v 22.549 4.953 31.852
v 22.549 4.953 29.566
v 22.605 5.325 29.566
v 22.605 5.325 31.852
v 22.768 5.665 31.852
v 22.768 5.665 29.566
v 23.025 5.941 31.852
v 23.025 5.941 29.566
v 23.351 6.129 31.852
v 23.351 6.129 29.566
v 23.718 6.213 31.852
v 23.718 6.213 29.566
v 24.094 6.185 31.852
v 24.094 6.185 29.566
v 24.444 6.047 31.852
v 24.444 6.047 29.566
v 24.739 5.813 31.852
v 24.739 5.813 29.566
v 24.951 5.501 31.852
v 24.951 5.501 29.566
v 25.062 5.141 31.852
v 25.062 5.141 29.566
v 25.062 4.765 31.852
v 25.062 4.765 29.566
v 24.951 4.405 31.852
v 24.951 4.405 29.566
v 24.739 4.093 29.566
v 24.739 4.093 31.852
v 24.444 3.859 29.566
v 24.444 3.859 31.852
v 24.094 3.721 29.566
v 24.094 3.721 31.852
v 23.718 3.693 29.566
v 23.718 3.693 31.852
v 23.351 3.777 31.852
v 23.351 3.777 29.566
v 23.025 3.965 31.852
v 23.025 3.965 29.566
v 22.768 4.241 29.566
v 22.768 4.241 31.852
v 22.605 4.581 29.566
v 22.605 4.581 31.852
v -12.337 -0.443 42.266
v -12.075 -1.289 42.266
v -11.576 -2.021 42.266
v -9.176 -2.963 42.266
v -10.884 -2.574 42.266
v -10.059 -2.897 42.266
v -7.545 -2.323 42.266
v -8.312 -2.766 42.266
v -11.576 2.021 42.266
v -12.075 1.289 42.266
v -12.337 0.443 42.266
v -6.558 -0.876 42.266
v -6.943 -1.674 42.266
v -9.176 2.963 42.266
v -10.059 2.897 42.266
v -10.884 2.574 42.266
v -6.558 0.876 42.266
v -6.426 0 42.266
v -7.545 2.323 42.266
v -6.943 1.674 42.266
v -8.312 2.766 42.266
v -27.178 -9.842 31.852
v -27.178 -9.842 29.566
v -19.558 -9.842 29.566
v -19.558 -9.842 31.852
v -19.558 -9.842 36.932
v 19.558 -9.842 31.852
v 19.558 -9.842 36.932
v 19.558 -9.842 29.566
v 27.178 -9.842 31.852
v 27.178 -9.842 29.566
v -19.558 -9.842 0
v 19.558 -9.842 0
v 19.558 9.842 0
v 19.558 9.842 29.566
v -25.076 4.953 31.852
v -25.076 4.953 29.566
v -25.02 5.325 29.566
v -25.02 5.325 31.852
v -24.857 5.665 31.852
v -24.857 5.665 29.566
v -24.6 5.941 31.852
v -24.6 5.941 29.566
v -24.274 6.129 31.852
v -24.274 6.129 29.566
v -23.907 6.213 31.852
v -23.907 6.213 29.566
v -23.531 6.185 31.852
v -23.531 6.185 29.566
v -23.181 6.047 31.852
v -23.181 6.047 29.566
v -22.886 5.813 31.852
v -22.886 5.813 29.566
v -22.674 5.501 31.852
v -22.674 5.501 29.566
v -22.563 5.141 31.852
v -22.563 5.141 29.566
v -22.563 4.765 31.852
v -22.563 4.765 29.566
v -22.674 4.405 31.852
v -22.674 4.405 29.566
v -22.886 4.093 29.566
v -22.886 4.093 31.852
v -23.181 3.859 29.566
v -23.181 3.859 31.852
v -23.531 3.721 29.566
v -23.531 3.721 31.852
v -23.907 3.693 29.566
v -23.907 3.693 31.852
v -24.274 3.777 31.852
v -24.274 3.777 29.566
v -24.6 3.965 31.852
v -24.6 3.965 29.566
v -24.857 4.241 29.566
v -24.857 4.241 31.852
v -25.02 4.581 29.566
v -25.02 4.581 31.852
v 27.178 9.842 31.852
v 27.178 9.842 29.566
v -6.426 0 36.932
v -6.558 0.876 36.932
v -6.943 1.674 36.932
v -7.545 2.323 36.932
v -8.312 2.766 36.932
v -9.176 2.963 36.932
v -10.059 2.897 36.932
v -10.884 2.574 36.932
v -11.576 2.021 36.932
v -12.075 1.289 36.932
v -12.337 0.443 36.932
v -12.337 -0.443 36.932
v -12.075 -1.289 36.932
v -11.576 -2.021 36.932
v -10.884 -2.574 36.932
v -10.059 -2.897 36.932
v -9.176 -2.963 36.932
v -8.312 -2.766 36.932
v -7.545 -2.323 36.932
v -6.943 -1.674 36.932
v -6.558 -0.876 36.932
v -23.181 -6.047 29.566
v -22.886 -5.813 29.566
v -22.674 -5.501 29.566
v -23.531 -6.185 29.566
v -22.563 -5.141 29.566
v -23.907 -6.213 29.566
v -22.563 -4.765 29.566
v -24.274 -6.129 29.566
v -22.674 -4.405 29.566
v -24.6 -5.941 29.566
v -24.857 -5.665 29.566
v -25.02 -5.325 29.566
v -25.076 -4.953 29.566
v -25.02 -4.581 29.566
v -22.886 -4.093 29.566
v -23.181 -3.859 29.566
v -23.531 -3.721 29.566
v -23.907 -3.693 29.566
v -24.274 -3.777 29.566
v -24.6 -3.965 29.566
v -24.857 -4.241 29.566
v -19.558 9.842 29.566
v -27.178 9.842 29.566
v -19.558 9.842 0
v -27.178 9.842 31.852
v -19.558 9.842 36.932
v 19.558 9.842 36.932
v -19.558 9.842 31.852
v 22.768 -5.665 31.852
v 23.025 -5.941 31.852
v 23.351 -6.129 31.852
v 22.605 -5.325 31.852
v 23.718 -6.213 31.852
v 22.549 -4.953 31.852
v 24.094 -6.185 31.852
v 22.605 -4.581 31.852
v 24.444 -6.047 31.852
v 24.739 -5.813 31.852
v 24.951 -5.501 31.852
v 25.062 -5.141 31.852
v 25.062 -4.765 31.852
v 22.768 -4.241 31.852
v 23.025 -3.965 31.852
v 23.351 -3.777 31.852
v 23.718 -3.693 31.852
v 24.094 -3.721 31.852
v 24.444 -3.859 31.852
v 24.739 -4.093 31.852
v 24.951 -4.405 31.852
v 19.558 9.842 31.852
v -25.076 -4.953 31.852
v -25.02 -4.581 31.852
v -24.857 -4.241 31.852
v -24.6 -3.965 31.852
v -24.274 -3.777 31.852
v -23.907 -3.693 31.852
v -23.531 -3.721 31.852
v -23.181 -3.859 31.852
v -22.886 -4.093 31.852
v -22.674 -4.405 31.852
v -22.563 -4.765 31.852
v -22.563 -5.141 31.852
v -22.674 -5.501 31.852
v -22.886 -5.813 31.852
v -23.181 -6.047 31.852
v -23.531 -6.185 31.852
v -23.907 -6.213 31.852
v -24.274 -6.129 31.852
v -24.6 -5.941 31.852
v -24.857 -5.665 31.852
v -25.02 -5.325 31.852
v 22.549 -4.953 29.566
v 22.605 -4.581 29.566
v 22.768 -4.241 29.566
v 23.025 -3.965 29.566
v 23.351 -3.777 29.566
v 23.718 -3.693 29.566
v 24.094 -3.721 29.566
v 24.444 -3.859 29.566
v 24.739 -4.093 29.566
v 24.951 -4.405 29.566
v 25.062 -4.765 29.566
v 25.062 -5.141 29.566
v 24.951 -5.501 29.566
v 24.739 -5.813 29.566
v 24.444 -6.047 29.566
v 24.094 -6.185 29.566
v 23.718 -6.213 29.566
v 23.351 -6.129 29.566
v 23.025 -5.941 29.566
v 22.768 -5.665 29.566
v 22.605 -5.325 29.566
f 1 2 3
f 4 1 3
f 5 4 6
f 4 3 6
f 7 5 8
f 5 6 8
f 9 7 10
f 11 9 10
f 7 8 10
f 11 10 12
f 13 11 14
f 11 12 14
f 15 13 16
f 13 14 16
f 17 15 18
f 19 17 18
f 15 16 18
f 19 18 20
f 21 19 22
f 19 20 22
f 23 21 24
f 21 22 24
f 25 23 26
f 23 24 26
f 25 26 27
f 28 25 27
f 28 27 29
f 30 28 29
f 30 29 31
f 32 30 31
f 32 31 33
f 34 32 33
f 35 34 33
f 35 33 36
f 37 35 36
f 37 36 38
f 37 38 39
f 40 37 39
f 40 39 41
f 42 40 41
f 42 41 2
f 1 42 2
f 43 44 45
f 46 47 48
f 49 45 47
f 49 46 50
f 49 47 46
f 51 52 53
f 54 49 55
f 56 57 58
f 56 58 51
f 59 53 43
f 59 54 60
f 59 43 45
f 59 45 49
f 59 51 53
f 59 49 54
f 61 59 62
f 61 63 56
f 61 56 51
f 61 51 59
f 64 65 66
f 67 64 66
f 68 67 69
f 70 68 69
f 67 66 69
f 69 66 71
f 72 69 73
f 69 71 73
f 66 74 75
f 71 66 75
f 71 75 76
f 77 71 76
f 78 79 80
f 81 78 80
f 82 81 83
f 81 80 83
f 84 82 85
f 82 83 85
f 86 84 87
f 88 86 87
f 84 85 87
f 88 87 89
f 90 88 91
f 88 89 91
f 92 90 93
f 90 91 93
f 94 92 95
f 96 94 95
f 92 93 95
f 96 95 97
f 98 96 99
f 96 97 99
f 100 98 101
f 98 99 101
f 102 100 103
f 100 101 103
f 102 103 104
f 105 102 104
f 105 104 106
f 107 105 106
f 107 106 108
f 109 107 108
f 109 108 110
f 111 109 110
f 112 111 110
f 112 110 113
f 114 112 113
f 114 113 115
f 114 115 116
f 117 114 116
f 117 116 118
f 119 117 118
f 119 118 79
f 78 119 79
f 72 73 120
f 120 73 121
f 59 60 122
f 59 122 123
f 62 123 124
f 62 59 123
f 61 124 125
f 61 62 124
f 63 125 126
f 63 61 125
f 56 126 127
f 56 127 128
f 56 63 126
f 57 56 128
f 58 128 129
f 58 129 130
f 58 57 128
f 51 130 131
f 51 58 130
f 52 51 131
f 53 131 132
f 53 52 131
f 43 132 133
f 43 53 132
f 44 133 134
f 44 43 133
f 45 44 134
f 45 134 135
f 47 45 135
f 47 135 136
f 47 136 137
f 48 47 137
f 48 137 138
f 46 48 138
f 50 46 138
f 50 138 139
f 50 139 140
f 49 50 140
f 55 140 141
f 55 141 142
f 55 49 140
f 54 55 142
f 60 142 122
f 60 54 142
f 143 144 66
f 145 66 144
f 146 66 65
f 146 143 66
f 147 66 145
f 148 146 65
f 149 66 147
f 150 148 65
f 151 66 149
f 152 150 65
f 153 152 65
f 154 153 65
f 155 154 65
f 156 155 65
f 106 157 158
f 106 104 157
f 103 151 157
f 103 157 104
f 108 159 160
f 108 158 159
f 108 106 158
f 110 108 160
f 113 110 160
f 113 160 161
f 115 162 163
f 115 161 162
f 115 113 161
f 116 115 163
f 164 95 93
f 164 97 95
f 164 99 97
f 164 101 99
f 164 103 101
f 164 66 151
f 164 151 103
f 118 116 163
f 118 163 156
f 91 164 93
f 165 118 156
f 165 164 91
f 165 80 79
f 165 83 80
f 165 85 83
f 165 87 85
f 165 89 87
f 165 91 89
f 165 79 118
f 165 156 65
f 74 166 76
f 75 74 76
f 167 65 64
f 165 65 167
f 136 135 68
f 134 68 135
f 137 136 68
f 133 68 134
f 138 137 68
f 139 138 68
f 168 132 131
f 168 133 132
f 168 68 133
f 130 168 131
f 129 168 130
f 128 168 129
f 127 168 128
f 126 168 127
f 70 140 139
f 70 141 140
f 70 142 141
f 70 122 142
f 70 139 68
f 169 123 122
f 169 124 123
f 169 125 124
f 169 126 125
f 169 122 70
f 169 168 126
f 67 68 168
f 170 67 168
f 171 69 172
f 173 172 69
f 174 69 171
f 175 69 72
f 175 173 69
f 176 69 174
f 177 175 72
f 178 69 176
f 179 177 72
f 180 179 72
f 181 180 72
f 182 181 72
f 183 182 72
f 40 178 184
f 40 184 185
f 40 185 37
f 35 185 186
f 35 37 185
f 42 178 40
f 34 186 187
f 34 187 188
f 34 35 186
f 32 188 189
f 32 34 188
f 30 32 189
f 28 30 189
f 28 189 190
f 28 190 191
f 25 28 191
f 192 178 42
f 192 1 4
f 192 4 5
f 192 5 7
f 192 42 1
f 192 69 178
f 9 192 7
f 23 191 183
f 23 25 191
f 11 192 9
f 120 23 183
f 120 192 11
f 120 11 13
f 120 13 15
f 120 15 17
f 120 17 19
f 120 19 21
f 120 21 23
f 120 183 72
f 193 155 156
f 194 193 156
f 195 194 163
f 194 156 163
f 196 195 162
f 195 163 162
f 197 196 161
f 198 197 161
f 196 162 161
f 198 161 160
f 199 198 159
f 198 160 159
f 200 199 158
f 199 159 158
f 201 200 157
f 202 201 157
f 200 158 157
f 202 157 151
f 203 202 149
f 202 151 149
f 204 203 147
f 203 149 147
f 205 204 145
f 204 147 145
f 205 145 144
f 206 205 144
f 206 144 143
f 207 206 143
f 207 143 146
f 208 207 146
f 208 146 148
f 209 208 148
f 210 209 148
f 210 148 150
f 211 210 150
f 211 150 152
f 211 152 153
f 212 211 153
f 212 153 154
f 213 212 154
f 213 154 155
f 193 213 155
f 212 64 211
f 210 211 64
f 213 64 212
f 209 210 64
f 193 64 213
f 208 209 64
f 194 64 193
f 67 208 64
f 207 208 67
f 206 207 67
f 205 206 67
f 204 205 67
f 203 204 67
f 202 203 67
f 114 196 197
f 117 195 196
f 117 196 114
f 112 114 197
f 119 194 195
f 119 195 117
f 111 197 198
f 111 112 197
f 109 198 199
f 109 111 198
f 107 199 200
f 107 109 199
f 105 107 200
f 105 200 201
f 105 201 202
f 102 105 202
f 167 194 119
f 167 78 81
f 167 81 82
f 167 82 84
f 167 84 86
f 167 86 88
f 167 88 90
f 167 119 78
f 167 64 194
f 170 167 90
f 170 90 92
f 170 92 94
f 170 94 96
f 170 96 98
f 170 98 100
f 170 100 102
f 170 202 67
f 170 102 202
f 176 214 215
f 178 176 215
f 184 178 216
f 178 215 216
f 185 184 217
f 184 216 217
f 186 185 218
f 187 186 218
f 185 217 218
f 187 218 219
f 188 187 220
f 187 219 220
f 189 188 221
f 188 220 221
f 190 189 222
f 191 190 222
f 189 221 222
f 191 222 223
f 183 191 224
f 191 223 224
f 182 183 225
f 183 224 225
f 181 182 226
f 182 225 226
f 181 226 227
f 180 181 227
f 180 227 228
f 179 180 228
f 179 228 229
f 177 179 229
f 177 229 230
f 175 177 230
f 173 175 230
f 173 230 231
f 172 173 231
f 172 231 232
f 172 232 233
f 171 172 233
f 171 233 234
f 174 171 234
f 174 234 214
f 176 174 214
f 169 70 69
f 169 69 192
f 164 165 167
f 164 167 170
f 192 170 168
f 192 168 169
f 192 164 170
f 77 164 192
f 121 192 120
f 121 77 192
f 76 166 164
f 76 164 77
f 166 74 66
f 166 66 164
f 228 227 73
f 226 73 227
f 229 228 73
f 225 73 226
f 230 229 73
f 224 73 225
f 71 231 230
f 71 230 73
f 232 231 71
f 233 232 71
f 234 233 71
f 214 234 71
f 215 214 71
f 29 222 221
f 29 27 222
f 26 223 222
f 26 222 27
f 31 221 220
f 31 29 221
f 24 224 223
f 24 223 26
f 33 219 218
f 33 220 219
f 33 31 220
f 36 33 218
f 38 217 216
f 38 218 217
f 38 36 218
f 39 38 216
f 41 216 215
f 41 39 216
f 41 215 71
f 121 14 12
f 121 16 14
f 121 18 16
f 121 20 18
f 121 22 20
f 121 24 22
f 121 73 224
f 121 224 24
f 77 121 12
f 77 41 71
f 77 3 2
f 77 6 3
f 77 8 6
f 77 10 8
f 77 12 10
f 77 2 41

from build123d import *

# Parameters (mm, degrees)
SKETCH1_W                        = 54.356
SKETCH1_H                        = 19.685
EXTRUDE1_DEPTH                   = 42.2656
SKETCH3_OUTSIDE_W                = 70.678
SKETCH3_OUTSIDE_H                = 36.007
SKETCH3_OUTSIDE_R                = 2.9718
EXTRUDE2_DEPTH                   = 5.334
SKETCH7_W                        = 7.62
SKETCH7_H                        = 20.335773086
SKETCH7_H_2                      = 19.919316746
EXTRUDE4_DEPTH                   = 10.414
SKETCH8_W                        = 7.62
SKETCH8_H                        = 19.792977092
SKETCH8_H_2                      = 19.986836906
EXTRUDE5_DEPTH                   = 29.5656
F_39_0_0995_DIAMETER_HOLE1_D     = 2.5273
F_39_0_0995_DIAMETER_HOLE1_DEPTH = 12.7
F_39_0_0995_DIAMETER_HOLE1_TIP   = 0.759277521


with BuildPart() as part:
    # Sketch1 → Extrude1 (new body)
    with BuildSketch(Plane.XY):
        Rectangle(SKETCH1_W, SKETCH1_H)
    extrude(amount=EXTRUDE1_DEPTH)

    # Sketch3 outside → Extrude2 (cut)
    with BuildSketch(Plane.XY.offset(42.2656)):
        with Locations((0, 0.0005)):
            Rectangle(SKETCH3_OUTSIDE_W, SKETCH3_OUTSIDE_H)
        with Locations((-9.398, 0)):
            Circle(SKETCH3_OUTSIDE_R, mode=Mode.SUBTRACT)
    extrude(amount=-EXTRUDE2_DEPTH, mode=Mode.SUBTRACT)

    # Sketch7 → Extrude4 (cut)
    with BuildSketch(Plane.XY.offset(42.2656)):
        with Locations((23.368, 0)):
            Rectangle(SKETCH7_W, SKETCH7_H)
        with Locations((-23.368, 0)):
            Rectangle(SKETCH7_W, SKETCH7_H_2)
    extrude(amount=-EXTRUDE4_DEPTH, mode=Mode.SUBTRACT)

    # Sketch8 → Extrude5 (cut)
    with BuildSketch(Plane(origin=(0, 0, 0), x_dir=(-1, 0, 0), z_dir=(0, 0, -1))):
        with Locations((23.368, 0)):
            Rectangle(SKETCH8_W, SKETCH8_H)
        with Locations((-23.368, 0)):
            Rectangle(SKETCH8_W, SKETCH8_H_2)
    extrude(amount=-EXTRUDE5_DEPTH, mode=Mode.SUBTRACT)

    # #39 (0.0995) Diameter Hole1
    with Locations(Plane(origin=(-23.8125, 4.953, 31.8516), x_dir=(1, 0, 0), z_dir=(0, 0, 1))):
        with Locations((0, 0), (0, -9.906), (47.625, 0), (47.625, -9.906)):
            Hole(F_39_0_0995_DIAMETER_HOLE1_D / 2, depth=F_39_0_0995_DIAMETER_HOLE1_DEPTH)
            with Locations((0, 0, -(F_39_0_0995_DIAMETER_HOLE1_DEPTH + F_39_0_0995_DIAMETER_HOLE1_TIP / 2))):  # 118° drill point
                Cone(0, F_39_0_0995_DIAMETER_HOLE1_D / 2, F_39_0_0995_DIAMETER_HOLE1_TIP, mode=Mode.SUBTRACT)


solid = part.part
